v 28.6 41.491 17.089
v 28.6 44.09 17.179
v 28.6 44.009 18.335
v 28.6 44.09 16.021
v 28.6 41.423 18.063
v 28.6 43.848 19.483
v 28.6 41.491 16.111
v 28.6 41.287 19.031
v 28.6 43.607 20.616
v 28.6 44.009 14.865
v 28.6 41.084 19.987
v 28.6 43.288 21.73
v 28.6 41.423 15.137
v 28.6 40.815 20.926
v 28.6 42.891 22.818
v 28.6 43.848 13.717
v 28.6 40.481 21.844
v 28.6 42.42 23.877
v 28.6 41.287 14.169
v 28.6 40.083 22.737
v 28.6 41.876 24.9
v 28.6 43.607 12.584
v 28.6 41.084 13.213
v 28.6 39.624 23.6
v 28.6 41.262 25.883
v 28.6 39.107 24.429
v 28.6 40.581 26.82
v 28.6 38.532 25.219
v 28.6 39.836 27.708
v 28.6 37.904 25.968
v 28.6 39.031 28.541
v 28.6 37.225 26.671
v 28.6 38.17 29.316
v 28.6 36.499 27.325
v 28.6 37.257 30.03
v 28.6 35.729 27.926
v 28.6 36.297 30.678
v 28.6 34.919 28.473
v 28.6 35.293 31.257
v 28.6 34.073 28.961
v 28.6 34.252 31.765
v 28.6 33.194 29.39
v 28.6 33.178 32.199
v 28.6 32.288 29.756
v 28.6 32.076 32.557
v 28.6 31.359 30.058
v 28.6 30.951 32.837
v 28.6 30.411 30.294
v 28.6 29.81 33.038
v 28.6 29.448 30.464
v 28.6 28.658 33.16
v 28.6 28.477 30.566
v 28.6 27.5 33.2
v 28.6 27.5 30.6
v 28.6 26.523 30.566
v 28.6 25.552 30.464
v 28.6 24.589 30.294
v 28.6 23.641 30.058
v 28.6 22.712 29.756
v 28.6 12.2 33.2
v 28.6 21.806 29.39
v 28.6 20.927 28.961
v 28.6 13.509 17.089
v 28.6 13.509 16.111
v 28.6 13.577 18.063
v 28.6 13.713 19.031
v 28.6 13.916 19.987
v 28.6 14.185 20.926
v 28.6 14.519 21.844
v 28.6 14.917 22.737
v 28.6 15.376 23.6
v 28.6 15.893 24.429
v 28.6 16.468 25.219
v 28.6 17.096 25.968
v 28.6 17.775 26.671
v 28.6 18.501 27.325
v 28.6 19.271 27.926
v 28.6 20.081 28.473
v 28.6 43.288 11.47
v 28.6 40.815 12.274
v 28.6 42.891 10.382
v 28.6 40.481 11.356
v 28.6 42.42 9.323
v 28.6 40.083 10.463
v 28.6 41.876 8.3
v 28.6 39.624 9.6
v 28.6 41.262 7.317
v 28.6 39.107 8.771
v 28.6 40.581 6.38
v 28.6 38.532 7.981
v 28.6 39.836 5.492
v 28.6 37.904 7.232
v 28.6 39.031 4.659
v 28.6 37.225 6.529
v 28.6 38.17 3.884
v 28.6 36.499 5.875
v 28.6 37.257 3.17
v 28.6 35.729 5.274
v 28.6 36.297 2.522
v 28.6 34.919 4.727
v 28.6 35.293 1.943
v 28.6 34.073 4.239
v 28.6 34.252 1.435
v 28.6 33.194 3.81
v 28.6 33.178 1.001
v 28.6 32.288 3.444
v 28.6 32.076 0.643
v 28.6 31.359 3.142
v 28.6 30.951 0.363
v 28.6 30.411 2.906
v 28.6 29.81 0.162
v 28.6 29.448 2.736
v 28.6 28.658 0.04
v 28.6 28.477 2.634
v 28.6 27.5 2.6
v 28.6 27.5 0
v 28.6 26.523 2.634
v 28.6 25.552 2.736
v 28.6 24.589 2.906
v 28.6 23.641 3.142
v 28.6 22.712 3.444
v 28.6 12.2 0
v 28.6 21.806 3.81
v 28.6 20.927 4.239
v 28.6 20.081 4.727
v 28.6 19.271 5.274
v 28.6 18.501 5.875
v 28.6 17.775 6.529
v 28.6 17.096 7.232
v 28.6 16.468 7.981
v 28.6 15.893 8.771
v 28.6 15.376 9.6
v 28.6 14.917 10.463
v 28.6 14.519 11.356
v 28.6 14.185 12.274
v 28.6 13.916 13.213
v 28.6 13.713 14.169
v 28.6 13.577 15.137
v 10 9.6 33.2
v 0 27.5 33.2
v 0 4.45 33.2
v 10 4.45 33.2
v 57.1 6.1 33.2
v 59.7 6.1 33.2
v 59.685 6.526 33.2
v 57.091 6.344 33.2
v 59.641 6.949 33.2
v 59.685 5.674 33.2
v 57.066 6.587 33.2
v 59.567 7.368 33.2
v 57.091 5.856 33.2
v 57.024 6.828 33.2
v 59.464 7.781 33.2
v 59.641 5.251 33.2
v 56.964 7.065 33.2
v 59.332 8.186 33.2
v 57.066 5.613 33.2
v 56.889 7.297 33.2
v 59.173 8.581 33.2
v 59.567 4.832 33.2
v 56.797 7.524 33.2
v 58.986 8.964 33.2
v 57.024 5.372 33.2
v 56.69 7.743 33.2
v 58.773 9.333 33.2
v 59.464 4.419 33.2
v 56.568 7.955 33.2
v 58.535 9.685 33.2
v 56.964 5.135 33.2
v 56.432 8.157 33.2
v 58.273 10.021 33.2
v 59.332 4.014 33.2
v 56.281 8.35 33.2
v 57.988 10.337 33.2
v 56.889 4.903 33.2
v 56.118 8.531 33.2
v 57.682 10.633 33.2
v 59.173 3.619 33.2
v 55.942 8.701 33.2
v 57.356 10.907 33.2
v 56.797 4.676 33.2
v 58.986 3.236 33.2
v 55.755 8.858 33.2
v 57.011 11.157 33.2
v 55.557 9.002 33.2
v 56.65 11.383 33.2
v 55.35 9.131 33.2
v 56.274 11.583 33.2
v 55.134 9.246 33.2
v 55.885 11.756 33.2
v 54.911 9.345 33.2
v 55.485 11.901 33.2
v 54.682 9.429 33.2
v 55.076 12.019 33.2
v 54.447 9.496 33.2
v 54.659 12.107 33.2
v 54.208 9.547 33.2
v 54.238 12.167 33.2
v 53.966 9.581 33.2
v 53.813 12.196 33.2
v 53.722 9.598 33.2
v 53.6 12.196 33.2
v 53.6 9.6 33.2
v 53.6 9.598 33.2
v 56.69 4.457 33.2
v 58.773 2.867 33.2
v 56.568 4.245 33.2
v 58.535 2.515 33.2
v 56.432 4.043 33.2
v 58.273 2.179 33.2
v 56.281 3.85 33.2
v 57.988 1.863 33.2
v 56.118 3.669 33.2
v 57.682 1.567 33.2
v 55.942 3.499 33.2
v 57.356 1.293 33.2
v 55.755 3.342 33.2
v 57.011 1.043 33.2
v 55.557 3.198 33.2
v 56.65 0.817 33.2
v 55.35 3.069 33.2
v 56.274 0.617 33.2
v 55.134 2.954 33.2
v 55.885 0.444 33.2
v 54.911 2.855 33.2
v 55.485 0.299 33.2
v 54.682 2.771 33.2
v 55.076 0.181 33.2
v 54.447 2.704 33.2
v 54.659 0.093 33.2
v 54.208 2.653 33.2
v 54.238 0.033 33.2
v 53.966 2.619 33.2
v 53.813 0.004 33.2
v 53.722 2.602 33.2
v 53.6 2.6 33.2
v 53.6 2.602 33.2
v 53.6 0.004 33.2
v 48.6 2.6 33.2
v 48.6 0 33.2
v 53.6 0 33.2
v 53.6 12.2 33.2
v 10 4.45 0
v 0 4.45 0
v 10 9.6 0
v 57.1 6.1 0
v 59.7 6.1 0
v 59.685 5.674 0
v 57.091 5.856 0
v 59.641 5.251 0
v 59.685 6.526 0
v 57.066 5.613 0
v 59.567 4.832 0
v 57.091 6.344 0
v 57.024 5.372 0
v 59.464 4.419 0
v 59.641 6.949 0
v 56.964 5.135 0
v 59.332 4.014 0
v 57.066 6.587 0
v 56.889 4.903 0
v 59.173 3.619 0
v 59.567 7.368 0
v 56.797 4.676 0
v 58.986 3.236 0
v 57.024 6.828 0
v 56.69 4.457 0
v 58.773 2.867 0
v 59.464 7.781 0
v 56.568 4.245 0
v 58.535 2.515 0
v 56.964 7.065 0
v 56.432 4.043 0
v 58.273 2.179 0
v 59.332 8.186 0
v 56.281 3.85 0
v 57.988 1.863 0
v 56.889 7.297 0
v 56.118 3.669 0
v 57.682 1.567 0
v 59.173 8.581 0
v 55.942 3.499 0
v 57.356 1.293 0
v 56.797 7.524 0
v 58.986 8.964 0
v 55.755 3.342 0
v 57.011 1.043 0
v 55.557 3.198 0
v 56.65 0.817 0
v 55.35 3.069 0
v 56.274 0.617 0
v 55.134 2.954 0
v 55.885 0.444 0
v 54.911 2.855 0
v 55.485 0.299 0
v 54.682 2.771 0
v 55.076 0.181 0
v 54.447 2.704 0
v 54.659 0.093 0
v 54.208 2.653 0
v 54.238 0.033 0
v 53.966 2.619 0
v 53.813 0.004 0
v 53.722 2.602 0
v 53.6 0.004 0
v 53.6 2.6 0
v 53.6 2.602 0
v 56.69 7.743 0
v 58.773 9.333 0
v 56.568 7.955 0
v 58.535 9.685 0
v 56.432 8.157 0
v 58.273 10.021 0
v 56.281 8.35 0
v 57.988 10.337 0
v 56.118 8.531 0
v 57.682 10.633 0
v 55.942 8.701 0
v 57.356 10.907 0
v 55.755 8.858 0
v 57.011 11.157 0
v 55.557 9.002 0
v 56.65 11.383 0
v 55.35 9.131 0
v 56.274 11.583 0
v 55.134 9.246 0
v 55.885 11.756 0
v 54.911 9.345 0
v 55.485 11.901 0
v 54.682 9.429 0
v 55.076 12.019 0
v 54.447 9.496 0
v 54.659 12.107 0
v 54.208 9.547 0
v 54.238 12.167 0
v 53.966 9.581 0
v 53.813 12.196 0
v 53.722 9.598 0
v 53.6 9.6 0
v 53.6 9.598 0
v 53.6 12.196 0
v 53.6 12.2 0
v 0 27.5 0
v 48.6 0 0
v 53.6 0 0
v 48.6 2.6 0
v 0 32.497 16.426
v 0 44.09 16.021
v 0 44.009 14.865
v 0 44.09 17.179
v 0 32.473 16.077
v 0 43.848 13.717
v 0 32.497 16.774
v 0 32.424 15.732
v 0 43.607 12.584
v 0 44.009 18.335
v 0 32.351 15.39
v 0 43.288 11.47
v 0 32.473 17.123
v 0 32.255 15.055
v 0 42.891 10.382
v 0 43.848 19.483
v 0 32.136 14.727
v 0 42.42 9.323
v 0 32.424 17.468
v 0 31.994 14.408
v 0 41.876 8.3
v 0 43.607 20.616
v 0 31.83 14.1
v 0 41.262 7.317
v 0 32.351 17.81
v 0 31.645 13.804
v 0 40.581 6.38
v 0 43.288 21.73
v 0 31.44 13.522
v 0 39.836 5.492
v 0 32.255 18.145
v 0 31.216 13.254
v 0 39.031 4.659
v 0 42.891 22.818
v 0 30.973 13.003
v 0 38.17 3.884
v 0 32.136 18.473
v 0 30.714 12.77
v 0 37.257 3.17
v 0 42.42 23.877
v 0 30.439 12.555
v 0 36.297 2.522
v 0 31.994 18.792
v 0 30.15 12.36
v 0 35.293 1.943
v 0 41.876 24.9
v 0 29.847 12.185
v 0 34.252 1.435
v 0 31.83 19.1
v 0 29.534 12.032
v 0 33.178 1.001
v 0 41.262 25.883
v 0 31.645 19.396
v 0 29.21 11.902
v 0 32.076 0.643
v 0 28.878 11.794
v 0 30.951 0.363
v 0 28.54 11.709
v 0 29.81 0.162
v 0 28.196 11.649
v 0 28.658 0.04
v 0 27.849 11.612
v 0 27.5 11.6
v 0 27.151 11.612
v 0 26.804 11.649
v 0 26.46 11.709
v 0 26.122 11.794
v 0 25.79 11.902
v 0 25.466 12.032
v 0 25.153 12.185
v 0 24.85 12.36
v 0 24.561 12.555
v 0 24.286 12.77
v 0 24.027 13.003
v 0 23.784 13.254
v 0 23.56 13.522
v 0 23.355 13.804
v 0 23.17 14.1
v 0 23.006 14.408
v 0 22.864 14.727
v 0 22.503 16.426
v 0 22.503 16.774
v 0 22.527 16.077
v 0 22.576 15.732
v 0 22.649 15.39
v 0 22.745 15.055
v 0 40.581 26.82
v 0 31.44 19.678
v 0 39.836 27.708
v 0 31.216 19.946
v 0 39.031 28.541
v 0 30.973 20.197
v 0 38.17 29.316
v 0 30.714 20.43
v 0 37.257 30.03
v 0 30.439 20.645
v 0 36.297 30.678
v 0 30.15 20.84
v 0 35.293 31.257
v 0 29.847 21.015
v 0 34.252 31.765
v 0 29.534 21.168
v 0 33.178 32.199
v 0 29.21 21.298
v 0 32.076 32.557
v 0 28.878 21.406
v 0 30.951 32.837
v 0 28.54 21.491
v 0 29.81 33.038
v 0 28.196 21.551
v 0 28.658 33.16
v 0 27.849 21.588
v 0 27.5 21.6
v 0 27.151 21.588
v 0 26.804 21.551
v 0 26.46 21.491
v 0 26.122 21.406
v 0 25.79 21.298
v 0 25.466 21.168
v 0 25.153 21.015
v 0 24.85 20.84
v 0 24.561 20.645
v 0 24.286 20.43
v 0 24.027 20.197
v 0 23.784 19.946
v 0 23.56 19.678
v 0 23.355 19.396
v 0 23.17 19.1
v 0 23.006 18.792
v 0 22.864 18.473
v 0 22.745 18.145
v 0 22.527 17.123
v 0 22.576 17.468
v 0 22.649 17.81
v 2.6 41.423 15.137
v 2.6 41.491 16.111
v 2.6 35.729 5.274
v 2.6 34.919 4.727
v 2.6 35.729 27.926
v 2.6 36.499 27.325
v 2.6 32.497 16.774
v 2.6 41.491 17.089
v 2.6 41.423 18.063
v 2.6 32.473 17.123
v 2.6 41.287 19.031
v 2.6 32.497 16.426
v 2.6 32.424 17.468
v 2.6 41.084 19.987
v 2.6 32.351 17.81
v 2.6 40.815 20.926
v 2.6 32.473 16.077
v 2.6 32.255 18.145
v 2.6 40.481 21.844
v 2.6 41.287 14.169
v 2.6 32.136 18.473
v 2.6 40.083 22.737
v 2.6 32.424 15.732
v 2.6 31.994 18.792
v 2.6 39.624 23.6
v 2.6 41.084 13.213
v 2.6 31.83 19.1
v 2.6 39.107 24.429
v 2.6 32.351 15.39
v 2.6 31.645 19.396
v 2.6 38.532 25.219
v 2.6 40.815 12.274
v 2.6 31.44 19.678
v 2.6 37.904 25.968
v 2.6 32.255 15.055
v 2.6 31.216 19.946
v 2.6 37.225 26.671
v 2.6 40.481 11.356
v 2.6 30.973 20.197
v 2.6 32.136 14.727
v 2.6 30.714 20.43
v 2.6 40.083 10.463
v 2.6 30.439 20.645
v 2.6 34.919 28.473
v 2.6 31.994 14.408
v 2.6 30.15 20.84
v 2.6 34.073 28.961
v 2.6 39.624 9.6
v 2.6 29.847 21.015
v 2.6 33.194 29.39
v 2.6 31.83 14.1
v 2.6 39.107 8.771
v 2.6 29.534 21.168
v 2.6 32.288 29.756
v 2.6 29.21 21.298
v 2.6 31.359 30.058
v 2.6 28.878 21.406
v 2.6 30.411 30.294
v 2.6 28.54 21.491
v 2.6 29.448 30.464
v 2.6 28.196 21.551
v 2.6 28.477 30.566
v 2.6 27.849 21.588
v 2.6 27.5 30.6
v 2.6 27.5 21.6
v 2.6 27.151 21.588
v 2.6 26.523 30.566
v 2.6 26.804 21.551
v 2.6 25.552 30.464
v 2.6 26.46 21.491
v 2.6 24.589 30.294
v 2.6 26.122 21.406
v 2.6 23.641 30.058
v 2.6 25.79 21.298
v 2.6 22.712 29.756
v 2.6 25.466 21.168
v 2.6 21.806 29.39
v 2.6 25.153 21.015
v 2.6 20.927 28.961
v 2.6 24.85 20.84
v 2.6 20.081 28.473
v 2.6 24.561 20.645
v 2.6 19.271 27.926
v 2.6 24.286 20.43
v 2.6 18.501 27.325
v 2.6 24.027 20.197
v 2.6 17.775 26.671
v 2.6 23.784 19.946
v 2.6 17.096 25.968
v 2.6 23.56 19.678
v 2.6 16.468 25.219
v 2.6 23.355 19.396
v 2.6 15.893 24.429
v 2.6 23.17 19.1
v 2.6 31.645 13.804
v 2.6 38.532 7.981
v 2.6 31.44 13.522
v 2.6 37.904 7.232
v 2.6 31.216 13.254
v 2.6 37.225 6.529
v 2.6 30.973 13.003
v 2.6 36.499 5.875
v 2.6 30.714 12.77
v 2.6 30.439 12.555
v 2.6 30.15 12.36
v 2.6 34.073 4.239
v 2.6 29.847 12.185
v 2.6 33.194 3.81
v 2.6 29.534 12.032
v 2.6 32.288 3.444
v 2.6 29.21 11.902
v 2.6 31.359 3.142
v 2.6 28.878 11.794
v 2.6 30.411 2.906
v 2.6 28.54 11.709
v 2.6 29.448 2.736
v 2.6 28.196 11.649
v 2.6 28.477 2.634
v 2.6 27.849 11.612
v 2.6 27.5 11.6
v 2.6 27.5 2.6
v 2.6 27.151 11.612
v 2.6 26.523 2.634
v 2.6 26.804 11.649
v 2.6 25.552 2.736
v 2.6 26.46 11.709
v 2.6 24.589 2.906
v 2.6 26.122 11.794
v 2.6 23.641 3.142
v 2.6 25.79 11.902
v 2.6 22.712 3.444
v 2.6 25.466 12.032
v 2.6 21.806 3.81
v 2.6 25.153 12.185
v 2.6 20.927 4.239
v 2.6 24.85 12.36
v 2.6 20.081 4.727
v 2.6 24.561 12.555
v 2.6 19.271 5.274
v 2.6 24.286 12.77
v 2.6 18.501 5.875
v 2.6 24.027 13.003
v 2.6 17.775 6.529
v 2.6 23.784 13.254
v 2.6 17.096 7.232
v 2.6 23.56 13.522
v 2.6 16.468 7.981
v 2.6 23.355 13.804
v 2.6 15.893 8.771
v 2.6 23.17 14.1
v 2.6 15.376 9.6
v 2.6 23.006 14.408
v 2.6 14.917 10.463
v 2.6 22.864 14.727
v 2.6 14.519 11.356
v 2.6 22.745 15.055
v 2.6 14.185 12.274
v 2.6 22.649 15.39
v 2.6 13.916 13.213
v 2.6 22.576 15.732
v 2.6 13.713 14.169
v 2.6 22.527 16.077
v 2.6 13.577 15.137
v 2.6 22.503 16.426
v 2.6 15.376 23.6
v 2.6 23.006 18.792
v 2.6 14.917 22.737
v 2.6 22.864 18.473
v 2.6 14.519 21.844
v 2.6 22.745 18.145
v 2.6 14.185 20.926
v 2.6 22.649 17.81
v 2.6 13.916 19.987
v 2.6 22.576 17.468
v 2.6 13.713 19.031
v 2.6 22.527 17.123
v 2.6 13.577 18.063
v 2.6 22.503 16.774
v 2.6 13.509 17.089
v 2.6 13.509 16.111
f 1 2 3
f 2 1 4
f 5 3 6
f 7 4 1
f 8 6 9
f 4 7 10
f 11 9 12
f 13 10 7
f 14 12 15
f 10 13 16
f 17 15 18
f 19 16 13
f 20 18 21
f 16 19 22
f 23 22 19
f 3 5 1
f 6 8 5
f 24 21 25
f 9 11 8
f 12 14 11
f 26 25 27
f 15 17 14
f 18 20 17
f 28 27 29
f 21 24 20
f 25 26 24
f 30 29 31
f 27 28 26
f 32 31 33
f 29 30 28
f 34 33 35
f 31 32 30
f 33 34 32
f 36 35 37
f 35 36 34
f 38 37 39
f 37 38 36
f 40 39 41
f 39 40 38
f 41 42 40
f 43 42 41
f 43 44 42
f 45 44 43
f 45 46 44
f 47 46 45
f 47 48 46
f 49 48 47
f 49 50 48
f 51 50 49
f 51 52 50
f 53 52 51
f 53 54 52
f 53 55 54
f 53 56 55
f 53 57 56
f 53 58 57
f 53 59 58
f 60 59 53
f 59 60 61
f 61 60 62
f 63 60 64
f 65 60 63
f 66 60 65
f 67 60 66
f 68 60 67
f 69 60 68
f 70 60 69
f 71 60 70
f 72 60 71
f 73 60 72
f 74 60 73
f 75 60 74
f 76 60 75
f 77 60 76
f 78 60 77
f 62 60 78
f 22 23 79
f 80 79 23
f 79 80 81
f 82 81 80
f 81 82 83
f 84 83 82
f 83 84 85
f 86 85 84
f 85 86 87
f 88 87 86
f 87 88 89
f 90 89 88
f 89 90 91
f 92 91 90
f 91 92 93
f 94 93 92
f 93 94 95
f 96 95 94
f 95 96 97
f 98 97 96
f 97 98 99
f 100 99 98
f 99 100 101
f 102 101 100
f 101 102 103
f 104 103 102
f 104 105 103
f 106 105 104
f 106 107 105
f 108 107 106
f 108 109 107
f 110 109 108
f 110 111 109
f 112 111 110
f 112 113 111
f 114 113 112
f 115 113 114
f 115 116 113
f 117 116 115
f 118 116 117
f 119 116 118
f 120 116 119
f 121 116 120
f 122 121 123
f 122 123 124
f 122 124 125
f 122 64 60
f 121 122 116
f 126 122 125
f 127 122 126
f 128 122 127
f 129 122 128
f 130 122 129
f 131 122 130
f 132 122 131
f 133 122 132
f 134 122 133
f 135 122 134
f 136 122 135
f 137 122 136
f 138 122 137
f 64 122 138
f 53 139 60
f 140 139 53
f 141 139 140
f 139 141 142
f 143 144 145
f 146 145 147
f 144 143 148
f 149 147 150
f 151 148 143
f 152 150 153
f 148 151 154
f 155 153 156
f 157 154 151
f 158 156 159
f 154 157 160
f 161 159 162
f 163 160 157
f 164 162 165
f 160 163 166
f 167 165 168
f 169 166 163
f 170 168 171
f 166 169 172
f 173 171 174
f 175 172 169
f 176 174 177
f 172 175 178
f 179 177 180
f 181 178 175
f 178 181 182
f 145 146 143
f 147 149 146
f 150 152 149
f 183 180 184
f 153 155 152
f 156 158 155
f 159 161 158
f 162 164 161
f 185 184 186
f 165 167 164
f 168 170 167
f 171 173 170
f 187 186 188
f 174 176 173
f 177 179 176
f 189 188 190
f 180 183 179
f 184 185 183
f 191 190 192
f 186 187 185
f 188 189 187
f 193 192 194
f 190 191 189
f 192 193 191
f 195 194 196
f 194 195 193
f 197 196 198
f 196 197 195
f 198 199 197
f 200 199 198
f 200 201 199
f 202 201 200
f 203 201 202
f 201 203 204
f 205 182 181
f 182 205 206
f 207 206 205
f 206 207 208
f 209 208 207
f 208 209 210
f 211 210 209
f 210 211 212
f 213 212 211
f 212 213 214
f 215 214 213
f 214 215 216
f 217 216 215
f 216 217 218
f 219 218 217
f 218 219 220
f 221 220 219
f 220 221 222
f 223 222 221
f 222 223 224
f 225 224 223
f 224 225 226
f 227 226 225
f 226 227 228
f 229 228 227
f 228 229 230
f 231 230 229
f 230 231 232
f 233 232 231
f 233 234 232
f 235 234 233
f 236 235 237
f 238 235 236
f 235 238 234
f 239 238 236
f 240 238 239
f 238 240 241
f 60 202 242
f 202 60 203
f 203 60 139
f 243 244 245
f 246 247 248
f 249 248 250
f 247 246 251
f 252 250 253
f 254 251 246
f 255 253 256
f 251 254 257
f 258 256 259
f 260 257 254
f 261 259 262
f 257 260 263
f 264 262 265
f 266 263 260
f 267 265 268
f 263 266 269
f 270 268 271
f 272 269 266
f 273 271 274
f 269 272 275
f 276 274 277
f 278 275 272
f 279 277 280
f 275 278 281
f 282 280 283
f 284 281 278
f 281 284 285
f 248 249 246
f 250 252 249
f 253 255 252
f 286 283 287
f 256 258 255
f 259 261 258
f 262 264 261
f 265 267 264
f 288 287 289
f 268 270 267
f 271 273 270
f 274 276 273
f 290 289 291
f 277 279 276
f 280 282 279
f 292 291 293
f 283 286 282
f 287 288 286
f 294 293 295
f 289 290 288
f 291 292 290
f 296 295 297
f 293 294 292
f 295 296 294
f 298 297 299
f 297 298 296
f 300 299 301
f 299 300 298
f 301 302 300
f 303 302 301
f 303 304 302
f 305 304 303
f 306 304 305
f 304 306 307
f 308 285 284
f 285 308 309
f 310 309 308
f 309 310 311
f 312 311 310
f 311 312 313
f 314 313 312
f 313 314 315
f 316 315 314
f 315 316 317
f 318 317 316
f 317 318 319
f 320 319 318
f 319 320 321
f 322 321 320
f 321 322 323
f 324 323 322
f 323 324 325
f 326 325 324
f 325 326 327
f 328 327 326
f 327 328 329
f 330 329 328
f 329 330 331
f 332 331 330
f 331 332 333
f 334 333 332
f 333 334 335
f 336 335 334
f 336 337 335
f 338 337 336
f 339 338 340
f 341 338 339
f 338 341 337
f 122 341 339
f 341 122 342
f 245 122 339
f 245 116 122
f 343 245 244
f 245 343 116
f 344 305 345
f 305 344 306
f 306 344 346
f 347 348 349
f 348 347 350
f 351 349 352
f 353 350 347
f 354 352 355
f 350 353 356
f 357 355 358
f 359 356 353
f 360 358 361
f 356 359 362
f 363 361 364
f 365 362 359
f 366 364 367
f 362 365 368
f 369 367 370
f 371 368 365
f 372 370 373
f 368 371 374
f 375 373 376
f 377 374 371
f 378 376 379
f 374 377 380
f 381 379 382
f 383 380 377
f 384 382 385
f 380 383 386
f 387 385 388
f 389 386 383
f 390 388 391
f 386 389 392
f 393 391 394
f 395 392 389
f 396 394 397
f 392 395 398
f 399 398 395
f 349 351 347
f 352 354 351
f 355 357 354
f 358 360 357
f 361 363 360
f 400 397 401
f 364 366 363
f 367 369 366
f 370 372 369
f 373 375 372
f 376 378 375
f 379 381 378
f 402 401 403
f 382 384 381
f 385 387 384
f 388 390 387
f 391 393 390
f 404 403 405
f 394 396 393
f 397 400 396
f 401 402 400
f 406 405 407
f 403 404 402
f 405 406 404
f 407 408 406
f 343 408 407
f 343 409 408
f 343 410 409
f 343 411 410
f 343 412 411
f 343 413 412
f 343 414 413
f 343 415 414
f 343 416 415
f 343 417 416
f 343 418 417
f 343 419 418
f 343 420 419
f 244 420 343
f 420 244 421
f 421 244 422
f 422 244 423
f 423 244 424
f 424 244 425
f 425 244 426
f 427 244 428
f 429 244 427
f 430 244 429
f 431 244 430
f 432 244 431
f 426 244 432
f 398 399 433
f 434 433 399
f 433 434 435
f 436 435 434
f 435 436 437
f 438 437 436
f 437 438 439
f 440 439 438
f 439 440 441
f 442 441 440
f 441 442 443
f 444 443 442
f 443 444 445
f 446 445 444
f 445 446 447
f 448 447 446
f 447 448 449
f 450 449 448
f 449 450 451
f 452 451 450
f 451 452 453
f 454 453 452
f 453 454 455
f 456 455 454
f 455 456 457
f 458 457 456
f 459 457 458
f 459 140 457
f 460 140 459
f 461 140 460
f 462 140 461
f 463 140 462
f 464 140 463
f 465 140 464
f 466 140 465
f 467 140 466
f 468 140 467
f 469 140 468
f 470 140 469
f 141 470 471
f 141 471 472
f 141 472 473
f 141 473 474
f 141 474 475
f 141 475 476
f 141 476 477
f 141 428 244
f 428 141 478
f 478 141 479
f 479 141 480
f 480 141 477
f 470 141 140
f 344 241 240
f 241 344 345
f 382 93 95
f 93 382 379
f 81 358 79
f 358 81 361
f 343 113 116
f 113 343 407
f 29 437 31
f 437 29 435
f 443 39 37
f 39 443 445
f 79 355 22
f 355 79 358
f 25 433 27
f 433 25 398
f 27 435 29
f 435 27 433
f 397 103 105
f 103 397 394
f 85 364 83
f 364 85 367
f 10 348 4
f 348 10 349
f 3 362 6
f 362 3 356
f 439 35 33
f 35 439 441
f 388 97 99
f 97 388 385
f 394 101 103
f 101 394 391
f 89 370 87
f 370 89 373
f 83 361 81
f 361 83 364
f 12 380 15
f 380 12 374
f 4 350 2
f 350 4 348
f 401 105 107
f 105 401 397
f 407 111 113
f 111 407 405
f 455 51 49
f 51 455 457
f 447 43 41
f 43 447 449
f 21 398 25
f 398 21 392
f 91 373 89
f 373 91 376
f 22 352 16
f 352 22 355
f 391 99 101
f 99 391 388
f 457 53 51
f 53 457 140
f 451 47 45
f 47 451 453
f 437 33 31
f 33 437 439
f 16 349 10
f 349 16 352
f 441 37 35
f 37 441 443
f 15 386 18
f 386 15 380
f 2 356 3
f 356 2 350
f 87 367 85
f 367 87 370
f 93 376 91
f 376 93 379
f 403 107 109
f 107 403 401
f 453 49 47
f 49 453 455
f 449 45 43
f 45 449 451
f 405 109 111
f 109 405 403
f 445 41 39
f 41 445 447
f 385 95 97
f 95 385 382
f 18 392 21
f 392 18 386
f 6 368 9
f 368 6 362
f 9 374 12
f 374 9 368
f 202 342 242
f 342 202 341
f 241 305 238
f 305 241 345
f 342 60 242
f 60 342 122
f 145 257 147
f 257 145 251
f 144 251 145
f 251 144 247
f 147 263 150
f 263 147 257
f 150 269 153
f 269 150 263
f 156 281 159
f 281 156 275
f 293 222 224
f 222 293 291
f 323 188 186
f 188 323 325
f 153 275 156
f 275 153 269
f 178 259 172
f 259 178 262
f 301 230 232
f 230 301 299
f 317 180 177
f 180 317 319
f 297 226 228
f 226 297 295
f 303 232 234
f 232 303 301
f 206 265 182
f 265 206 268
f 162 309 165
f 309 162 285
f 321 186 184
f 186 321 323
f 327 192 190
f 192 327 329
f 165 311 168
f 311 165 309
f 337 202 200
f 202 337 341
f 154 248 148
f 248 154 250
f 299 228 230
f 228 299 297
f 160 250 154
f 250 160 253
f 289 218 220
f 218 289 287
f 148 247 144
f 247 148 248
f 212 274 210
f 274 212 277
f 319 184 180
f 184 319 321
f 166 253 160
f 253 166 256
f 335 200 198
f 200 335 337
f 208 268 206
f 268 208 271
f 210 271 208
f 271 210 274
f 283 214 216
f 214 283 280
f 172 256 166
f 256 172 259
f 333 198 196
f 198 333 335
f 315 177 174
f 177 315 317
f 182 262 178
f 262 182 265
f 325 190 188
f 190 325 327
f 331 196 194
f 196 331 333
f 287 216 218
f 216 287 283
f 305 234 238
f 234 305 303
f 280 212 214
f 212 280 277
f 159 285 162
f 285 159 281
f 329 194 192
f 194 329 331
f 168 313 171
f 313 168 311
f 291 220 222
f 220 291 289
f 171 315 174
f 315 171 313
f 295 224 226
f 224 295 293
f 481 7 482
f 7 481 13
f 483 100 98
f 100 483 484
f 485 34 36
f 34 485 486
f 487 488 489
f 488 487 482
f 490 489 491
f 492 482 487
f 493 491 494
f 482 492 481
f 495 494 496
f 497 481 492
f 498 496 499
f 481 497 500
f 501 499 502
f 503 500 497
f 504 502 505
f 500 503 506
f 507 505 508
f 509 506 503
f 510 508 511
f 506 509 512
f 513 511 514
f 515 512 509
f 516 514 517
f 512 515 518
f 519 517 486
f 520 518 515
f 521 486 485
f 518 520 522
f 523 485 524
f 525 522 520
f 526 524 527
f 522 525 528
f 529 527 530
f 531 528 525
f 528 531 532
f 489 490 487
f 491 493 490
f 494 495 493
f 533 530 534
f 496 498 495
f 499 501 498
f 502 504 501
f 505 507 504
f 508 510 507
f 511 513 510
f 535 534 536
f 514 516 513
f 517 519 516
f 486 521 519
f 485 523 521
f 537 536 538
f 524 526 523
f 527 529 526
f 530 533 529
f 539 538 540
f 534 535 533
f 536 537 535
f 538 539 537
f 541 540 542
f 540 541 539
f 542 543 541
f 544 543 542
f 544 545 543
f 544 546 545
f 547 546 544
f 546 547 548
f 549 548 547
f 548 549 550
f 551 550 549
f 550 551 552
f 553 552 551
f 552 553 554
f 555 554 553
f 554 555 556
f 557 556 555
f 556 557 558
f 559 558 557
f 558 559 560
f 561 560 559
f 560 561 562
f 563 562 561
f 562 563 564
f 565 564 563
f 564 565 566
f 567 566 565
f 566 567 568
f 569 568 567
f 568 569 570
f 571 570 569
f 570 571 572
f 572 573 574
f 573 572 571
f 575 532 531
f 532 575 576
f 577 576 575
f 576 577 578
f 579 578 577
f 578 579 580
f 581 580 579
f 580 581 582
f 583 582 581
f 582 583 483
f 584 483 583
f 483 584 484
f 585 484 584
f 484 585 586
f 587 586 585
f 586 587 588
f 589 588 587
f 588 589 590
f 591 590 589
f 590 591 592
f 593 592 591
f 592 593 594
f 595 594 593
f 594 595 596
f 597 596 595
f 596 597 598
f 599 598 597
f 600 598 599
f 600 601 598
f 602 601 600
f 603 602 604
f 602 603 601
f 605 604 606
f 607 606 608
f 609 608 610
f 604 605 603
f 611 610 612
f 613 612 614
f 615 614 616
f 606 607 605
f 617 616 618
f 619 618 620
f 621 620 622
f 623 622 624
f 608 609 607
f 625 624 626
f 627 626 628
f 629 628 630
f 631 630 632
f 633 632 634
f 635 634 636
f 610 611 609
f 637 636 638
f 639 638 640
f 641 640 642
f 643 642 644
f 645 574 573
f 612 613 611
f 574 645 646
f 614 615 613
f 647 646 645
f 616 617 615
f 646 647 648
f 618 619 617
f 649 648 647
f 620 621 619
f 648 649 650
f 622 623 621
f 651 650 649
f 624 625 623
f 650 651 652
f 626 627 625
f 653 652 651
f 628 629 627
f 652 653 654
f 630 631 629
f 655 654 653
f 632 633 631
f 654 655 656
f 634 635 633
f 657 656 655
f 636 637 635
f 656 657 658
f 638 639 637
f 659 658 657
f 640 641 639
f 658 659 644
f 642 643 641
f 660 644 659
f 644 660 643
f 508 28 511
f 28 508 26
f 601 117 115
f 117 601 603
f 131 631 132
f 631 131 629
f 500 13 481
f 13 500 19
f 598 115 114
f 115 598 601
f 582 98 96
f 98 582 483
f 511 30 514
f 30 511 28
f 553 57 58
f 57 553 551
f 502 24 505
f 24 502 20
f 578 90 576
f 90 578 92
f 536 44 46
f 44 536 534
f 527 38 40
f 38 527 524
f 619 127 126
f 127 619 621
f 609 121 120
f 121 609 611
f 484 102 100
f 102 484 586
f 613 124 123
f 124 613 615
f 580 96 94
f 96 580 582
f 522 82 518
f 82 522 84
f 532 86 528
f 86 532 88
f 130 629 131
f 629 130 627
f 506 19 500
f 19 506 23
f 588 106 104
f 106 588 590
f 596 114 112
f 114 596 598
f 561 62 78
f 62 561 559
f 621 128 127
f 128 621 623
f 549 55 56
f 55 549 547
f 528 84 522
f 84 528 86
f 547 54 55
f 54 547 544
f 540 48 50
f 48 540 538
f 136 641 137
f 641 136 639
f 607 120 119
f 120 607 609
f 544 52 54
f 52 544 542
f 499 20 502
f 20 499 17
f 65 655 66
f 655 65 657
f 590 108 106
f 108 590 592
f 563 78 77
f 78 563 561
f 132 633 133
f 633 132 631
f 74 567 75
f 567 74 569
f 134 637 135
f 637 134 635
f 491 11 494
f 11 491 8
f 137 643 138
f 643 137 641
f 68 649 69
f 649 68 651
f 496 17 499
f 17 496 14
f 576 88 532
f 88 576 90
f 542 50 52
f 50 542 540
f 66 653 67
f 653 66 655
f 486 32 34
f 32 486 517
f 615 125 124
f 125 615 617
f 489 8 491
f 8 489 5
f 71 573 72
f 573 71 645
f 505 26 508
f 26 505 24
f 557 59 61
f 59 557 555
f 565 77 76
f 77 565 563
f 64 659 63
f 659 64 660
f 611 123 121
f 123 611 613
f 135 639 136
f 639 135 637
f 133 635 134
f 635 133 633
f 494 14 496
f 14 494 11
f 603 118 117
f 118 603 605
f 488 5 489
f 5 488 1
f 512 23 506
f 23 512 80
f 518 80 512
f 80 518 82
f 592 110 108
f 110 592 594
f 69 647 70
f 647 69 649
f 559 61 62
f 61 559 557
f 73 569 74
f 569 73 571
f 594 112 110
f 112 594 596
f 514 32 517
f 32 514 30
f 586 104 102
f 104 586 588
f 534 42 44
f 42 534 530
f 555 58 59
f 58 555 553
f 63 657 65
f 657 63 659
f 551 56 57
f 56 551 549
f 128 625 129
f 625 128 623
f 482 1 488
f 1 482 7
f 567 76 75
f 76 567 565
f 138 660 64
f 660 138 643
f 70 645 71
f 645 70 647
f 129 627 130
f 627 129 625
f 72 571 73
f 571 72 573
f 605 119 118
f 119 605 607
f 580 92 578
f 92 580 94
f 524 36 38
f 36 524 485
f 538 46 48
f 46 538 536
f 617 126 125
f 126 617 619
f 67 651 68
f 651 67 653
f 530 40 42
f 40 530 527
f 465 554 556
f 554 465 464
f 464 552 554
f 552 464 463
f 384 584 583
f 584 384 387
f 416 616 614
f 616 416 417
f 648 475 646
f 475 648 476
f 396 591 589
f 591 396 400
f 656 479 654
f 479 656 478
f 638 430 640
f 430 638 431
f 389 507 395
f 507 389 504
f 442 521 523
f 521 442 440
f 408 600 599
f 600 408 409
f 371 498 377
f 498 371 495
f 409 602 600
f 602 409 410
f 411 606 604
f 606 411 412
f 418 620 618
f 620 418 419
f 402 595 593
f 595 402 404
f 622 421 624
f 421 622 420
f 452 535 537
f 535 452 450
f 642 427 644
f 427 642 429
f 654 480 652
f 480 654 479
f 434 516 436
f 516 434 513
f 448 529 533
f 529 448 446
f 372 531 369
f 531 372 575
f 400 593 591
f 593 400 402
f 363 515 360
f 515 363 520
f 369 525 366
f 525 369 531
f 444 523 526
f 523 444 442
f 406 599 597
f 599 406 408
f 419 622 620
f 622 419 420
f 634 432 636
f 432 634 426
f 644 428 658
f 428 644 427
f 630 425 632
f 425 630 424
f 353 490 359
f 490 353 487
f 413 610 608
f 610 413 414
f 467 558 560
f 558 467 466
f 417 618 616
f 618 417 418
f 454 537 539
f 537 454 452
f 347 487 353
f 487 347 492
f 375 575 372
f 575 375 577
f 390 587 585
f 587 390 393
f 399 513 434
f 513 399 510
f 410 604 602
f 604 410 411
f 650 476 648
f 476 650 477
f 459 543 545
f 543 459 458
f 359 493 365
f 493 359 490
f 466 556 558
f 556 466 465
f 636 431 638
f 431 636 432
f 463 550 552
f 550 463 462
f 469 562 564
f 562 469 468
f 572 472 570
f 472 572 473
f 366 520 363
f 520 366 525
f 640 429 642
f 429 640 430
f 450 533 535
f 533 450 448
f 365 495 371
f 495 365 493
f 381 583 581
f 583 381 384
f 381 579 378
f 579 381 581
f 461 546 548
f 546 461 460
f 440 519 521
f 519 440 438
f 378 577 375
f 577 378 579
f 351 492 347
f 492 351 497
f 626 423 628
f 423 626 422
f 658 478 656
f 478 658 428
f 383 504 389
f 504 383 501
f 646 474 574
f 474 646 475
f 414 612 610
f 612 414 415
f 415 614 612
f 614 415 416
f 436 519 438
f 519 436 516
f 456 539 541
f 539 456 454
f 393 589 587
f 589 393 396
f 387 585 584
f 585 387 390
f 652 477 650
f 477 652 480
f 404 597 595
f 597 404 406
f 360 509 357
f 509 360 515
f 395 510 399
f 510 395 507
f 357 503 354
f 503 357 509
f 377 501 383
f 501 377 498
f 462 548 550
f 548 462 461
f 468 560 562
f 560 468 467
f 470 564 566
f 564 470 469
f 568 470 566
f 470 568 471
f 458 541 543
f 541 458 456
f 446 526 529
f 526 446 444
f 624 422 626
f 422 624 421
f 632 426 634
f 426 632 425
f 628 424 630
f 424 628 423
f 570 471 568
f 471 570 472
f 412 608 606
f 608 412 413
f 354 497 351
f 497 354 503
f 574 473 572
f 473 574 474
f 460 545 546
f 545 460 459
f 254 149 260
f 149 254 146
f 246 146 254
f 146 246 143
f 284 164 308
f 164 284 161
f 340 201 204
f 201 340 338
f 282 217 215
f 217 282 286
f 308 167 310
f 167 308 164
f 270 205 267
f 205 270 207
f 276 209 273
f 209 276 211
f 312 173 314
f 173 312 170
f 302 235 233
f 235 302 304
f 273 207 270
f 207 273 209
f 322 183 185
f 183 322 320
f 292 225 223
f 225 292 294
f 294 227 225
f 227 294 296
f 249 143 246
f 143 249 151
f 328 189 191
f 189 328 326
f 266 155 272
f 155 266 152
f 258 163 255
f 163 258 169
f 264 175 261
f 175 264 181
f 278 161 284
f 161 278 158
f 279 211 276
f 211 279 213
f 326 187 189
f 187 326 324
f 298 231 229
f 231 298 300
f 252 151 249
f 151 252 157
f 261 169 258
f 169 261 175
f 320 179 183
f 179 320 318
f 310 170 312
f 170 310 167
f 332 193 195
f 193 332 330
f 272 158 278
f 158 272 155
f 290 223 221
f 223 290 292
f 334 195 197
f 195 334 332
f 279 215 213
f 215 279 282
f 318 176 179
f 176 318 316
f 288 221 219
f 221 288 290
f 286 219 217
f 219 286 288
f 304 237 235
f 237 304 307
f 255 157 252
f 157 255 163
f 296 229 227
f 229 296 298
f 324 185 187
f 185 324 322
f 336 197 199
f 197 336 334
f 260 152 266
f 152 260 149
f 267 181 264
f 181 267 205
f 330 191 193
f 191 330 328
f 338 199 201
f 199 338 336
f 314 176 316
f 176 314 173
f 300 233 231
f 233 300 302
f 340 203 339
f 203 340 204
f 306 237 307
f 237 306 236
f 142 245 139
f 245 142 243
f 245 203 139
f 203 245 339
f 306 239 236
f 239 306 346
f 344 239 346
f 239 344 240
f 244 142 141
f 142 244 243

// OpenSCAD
$fa=4; // default minimum facet angle is now 0.5
$fs=0.05; // default minimum facet size is now 0.05 mm

hookInternal = 7;
hookOffset = 5.15;

offsetBlockLen = 10;
hookLen = 25;
hookShortLen = 5;

shaftDiam = 10;
collarDiam = 28;
collarDepth = 26;

wallThickness = 2.6;

difference() {
  union() {
    cube([collarDepth + wallThickness, collarDiam / 2 + wallThickness * 2.5 + hookInternal, collarDiam + wallThickness * 2]);
    translate([0, collarDiam / 2 + wallThickness * 2.5 + hookInternal, collarDiam / 2 + wallThickness]) rotate([0, 90, 0]) cylinder(r = collarDiam / 2 + wallThickness, h = collarDepth + wallThickness);
    cube([collarDepth + wallThickness + hookLen, hookInternal + wallThickness * 2, collarDiam + wallThickness * 2]);
    translate([collarDepth + wallThickness + hookLen, hookInternal / 2 + wallThickness, 0]) cylinder(r = hookInternal / 2 + wallThickness, h = collarDiam + wallThickness * 2);
  }

  #translate([wallThickness, collarDiam / 2 + wallThickness * 2.5 + hookInternal, collarDiam / 2 + wallThickness]) rotate([0, 90, 0]) cylinder(r = collarDiam / 2, h = collarDepth);
  #translate([0, collarDiam / 2 + wallThickness * 2.5 + hookInternal, collarDiam / 2 + wallThickness]) rotate([0, 90, 0]) cylinder(r = shaftDiam / 2, h = wallThickness);

  translate([collarDepth + wallThickness + hookLen, hookInternal / 2 + wallThickness, 0]) cylinder(r = hookInternal / 2, h = collarDiam + wallThickness * 2);
  translate([offsetBlockLen, wallThickness, 0]) cube([collarDepth + wallThickness + hookLen - offsetBlockLen, hookInternal, collarDiam + wallThickness * 2]);
  translate([offsetBlockLen, 0, 0]) cube([collarDepth + wallThickness + hookLen - offsetBlockLen - hookShortLen, hookInternal, collarDiam + wallThickness * 2]);
  cube([offsetBlockLen, wallThickness + hookInternal - hookOffset, collarDiam + wallThickness * 2]);
}
